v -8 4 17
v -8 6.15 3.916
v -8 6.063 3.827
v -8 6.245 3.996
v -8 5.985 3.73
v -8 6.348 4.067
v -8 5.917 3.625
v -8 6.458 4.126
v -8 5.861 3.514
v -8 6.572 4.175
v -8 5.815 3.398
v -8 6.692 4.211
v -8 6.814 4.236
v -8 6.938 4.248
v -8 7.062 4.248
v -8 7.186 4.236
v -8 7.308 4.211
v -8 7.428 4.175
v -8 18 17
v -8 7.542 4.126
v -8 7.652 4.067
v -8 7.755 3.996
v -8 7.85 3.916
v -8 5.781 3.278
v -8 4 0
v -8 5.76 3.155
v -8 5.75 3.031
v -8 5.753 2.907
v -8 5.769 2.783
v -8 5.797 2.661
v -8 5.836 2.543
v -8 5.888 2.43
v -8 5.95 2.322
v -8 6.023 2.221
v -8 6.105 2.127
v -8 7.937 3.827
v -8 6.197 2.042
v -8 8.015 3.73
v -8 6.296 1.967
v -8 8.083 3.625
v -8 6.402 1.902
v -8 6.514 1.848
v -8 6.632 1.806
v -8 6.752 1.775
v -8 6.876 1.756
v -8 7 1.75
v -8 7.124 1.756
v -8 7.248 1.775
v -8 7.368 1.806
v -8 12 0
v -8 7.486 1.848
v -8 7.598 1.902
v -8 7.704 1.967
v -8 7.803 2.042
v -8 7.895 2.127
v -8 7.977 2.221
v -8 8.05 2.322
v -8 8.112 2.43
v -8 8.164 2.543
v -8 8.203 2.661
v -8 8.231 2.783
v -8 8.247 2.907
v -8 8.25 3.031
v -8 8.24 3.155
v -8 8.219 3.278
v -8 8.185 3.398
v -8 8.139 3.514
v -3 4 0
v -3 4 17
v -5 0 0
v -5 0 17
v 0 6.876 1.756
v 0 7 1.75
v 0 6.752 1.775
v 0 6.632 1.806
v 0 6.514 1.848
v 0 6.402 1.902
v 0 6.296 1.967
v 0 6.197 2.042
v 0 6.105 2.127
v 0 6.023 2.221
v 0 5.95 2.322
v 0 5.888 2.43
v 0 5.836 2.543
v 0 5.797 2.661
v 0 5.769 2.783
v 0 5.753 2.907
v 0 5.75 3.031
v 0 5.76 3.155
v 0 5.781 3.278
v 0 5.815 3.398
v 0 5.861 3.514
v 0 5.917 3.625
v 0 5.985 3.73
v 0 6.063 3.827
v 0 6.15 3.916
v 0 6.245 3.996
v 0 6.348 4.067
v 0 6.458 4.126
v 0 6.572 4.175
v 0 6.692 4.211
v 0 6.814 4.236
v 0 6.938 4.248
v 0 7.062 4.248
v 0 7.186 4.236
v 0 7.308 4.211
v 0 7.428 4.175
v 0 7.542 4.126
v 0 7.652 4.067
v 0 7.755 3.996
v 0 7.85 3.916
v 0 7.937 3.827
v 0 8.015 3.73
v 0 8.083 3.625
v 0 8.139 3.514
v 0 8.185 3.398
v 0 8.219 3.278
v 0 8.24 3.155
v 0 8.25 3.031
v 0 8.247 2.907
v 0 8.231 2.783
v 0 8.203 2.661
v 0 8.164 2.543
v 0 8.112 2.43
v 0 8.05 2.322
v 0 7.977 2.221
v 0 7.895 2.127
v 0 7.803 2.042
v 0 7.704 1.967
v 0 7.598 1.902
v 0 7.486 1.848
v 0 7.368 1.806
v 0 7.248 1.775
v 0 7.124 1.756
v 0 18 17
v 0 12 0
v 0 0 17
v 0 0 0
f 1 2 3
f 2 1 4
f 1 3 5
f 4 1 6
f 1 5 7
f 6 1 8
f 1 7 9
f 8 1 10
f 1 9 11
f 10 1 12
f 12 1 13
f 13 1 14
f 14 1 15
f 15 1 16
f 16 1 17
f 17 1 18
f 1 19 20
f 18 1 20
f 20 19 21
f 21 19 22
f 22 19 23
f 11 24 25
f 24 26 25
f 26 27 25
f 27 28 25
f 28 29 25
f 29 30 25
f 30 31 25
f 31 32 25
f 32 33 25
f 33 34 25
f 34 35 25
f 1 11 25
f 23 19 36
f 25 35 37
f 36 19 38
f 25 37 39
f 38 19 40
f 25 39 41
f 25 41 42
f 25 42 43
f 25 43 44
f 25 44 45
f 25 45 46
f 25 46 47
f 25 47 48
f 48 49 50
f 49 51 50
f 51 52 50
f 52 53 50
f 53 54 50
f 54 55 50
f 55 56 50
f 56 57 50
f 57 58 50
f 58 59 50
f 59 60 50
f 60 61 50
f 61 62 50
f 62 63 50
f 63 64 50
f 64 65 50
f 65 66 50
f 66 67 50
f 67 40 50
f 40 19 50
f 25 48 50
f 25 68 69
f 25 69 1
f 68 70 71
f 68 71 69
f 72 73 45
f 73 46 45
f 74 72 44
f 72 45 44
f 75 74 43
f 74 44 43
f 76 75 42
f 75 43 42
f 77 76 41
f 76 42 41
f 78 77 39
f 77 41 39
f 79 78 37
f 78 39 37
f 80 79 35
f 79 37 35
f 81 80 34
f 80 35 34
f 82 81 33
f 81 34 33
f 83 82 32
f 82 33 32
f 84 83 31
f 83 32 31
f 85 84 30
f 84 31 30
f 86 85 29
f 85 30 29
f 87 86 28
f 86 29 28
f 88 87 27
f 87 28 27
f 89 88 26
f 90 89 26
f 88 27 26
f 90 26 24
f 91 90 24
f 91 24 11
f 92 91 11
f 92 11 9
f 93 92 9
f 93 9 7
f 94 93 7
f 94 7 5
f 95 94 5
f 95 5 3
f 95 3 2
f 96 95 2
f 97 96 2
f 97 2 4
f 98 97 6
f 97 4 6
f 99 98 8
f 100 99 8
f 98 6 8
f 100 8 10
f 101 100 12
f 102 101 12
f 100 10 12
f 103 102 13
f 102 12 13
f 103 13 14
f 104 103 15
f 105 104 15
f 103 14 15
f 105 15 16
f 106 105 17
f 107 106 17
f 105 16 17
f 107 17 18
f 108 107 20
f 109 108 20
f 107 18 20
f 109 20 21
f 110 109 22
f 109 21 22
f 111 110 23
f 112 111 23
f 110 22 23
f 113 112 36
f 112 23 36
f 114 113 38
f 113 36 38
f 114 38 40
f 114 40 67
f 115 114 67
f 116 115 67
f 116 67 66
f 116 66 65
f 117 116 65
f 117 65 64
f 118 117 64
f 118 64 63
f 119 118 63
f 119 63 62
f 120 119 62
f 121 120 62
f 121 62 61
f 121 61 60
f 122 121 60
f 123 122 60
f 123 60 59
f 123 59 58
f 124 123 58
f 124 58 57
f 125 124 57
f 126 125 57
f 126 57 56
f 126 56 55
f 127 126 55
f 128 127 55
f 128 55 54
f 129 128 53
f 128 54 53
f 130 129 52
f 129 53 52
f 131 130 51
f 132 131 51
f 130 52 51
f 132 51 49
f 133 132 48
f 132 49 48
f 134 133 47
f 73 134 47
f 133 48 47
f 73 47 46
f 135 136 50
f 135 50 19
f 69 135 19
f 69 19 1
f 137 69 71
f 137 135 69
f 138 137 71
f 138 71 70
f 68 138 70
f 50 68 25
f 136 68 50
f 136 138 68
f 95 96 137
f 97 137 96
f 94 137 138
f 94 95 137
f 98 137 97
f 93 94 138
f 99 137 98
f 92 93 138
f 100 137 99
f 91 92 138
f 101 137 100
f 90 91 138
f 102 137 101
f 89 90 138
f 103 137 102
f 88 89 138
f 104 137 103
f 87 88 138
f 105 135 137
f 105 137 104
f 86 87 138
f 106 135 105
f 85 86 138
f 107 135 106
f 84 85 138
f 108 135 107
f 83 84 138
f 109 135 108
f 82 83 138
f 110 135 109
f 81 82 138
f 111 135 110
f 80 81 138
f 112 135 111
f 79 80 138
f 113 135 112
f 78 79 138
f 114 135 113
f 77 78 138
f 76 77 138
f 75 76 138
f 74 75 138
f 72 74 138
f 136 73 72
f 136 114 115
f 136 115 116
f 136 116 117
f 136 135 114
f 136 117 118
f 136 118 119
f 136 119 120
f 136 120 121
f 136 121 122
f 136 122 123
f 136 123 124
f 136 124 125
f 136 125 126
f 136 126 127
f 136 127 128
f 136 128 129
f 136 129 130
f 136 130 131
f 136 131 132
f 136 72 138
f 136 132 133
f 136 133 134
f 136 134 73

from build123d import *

# Parameters (mm, degrees)
BOSS_EXTRUDE1_DEPTH   = 8
CUT_EXTRUDE2_DEPTH    = 27.019223663
M3X0_5_TAPPED_HOLE1_D = 2.5
SKETCH7_W             = 20.825163494
SKETCH7_H             = 21.535112249
CUT_EXTRUDE3_DEPTH    = 8


with BuildPart() as part:
    # Sketch1 → Boss-Extrude1 (new body)
    with BuildSketch(Plane(origin=(0, 0, 0), x_dir=(0, 0, -1), z_dir=(1, 0, 0))):
        Polygon((0, 0), (0, 12), (-17, 18), (-17, 0), align=None)
    boss_extrude1 = extrude(amount=BOSS_EXTRUDE1_DEPTH)

    # Sketch3 → Cut-Extrude2 (cut, through all)
    with BuildSketch(Plane(origin=(0, 0, 0), x_dir=(-1, 0, 0), z_dir=(0, 0, -1))):
        Polygon((-8, 0), (-5, 0), (-3, 4), (-8, 4), align=None)
    cut_extrude2 = extrude(amount=-CUT_EXTRUDE2_DEPTH, mode=Mode.SUBTRACT)

    # M3x0.5 Tapped Hole1 (through all)
    with Locations(Plane(origin=(8, 7, 3), x_dir=(0, 0, 1), z_dir=(1, 0, 0))):
        with Locations((0, 0)):
            m3x0_5_tapped_hole1 = Hole(M3X0_5_TAPPED_HOLE1_D / 2)

    # Mirror1: Boss-Extrude1, Cut-Extrude2, M3x0.5 Tapped Hole1 across plane
    add(boss_extrude1.mirror(Plane(origin=(0, 0, 0), x_dir=(0, 0, 1), z_dir=(1, 0, 0))))
    add(cut_extrude2.mirror(Plane(origin=(0, 0, 0), x_dir=(0, 0, 1), z_dir=(1, 0, 0))), mode=Mode.SUBTRACT)
    add(m3x0_5_tapped_hole1.mirror(Plane(origin=(0, 0, 0), x_dir=(0, 0, 1), z_dir=(1, 0, 0))), mode=Mode.SUBTRACT)

    # Sketch7 → Cut-Extrude3 (cut)
    with BuildSketch(Plane(origin=(8, 0, 0), x_dir=(0, 0, -1), z_dir=(1, 0, 0))):
        with Locations((-8.18446722, 8.52670083)):
            Rectangle(SKETCH7_W, SKETCH7_H)
    extrude(amount=-CUT_EXTRUDE3_DEPTH, mode=Mode.SUBTRACT)


solid = part.part
